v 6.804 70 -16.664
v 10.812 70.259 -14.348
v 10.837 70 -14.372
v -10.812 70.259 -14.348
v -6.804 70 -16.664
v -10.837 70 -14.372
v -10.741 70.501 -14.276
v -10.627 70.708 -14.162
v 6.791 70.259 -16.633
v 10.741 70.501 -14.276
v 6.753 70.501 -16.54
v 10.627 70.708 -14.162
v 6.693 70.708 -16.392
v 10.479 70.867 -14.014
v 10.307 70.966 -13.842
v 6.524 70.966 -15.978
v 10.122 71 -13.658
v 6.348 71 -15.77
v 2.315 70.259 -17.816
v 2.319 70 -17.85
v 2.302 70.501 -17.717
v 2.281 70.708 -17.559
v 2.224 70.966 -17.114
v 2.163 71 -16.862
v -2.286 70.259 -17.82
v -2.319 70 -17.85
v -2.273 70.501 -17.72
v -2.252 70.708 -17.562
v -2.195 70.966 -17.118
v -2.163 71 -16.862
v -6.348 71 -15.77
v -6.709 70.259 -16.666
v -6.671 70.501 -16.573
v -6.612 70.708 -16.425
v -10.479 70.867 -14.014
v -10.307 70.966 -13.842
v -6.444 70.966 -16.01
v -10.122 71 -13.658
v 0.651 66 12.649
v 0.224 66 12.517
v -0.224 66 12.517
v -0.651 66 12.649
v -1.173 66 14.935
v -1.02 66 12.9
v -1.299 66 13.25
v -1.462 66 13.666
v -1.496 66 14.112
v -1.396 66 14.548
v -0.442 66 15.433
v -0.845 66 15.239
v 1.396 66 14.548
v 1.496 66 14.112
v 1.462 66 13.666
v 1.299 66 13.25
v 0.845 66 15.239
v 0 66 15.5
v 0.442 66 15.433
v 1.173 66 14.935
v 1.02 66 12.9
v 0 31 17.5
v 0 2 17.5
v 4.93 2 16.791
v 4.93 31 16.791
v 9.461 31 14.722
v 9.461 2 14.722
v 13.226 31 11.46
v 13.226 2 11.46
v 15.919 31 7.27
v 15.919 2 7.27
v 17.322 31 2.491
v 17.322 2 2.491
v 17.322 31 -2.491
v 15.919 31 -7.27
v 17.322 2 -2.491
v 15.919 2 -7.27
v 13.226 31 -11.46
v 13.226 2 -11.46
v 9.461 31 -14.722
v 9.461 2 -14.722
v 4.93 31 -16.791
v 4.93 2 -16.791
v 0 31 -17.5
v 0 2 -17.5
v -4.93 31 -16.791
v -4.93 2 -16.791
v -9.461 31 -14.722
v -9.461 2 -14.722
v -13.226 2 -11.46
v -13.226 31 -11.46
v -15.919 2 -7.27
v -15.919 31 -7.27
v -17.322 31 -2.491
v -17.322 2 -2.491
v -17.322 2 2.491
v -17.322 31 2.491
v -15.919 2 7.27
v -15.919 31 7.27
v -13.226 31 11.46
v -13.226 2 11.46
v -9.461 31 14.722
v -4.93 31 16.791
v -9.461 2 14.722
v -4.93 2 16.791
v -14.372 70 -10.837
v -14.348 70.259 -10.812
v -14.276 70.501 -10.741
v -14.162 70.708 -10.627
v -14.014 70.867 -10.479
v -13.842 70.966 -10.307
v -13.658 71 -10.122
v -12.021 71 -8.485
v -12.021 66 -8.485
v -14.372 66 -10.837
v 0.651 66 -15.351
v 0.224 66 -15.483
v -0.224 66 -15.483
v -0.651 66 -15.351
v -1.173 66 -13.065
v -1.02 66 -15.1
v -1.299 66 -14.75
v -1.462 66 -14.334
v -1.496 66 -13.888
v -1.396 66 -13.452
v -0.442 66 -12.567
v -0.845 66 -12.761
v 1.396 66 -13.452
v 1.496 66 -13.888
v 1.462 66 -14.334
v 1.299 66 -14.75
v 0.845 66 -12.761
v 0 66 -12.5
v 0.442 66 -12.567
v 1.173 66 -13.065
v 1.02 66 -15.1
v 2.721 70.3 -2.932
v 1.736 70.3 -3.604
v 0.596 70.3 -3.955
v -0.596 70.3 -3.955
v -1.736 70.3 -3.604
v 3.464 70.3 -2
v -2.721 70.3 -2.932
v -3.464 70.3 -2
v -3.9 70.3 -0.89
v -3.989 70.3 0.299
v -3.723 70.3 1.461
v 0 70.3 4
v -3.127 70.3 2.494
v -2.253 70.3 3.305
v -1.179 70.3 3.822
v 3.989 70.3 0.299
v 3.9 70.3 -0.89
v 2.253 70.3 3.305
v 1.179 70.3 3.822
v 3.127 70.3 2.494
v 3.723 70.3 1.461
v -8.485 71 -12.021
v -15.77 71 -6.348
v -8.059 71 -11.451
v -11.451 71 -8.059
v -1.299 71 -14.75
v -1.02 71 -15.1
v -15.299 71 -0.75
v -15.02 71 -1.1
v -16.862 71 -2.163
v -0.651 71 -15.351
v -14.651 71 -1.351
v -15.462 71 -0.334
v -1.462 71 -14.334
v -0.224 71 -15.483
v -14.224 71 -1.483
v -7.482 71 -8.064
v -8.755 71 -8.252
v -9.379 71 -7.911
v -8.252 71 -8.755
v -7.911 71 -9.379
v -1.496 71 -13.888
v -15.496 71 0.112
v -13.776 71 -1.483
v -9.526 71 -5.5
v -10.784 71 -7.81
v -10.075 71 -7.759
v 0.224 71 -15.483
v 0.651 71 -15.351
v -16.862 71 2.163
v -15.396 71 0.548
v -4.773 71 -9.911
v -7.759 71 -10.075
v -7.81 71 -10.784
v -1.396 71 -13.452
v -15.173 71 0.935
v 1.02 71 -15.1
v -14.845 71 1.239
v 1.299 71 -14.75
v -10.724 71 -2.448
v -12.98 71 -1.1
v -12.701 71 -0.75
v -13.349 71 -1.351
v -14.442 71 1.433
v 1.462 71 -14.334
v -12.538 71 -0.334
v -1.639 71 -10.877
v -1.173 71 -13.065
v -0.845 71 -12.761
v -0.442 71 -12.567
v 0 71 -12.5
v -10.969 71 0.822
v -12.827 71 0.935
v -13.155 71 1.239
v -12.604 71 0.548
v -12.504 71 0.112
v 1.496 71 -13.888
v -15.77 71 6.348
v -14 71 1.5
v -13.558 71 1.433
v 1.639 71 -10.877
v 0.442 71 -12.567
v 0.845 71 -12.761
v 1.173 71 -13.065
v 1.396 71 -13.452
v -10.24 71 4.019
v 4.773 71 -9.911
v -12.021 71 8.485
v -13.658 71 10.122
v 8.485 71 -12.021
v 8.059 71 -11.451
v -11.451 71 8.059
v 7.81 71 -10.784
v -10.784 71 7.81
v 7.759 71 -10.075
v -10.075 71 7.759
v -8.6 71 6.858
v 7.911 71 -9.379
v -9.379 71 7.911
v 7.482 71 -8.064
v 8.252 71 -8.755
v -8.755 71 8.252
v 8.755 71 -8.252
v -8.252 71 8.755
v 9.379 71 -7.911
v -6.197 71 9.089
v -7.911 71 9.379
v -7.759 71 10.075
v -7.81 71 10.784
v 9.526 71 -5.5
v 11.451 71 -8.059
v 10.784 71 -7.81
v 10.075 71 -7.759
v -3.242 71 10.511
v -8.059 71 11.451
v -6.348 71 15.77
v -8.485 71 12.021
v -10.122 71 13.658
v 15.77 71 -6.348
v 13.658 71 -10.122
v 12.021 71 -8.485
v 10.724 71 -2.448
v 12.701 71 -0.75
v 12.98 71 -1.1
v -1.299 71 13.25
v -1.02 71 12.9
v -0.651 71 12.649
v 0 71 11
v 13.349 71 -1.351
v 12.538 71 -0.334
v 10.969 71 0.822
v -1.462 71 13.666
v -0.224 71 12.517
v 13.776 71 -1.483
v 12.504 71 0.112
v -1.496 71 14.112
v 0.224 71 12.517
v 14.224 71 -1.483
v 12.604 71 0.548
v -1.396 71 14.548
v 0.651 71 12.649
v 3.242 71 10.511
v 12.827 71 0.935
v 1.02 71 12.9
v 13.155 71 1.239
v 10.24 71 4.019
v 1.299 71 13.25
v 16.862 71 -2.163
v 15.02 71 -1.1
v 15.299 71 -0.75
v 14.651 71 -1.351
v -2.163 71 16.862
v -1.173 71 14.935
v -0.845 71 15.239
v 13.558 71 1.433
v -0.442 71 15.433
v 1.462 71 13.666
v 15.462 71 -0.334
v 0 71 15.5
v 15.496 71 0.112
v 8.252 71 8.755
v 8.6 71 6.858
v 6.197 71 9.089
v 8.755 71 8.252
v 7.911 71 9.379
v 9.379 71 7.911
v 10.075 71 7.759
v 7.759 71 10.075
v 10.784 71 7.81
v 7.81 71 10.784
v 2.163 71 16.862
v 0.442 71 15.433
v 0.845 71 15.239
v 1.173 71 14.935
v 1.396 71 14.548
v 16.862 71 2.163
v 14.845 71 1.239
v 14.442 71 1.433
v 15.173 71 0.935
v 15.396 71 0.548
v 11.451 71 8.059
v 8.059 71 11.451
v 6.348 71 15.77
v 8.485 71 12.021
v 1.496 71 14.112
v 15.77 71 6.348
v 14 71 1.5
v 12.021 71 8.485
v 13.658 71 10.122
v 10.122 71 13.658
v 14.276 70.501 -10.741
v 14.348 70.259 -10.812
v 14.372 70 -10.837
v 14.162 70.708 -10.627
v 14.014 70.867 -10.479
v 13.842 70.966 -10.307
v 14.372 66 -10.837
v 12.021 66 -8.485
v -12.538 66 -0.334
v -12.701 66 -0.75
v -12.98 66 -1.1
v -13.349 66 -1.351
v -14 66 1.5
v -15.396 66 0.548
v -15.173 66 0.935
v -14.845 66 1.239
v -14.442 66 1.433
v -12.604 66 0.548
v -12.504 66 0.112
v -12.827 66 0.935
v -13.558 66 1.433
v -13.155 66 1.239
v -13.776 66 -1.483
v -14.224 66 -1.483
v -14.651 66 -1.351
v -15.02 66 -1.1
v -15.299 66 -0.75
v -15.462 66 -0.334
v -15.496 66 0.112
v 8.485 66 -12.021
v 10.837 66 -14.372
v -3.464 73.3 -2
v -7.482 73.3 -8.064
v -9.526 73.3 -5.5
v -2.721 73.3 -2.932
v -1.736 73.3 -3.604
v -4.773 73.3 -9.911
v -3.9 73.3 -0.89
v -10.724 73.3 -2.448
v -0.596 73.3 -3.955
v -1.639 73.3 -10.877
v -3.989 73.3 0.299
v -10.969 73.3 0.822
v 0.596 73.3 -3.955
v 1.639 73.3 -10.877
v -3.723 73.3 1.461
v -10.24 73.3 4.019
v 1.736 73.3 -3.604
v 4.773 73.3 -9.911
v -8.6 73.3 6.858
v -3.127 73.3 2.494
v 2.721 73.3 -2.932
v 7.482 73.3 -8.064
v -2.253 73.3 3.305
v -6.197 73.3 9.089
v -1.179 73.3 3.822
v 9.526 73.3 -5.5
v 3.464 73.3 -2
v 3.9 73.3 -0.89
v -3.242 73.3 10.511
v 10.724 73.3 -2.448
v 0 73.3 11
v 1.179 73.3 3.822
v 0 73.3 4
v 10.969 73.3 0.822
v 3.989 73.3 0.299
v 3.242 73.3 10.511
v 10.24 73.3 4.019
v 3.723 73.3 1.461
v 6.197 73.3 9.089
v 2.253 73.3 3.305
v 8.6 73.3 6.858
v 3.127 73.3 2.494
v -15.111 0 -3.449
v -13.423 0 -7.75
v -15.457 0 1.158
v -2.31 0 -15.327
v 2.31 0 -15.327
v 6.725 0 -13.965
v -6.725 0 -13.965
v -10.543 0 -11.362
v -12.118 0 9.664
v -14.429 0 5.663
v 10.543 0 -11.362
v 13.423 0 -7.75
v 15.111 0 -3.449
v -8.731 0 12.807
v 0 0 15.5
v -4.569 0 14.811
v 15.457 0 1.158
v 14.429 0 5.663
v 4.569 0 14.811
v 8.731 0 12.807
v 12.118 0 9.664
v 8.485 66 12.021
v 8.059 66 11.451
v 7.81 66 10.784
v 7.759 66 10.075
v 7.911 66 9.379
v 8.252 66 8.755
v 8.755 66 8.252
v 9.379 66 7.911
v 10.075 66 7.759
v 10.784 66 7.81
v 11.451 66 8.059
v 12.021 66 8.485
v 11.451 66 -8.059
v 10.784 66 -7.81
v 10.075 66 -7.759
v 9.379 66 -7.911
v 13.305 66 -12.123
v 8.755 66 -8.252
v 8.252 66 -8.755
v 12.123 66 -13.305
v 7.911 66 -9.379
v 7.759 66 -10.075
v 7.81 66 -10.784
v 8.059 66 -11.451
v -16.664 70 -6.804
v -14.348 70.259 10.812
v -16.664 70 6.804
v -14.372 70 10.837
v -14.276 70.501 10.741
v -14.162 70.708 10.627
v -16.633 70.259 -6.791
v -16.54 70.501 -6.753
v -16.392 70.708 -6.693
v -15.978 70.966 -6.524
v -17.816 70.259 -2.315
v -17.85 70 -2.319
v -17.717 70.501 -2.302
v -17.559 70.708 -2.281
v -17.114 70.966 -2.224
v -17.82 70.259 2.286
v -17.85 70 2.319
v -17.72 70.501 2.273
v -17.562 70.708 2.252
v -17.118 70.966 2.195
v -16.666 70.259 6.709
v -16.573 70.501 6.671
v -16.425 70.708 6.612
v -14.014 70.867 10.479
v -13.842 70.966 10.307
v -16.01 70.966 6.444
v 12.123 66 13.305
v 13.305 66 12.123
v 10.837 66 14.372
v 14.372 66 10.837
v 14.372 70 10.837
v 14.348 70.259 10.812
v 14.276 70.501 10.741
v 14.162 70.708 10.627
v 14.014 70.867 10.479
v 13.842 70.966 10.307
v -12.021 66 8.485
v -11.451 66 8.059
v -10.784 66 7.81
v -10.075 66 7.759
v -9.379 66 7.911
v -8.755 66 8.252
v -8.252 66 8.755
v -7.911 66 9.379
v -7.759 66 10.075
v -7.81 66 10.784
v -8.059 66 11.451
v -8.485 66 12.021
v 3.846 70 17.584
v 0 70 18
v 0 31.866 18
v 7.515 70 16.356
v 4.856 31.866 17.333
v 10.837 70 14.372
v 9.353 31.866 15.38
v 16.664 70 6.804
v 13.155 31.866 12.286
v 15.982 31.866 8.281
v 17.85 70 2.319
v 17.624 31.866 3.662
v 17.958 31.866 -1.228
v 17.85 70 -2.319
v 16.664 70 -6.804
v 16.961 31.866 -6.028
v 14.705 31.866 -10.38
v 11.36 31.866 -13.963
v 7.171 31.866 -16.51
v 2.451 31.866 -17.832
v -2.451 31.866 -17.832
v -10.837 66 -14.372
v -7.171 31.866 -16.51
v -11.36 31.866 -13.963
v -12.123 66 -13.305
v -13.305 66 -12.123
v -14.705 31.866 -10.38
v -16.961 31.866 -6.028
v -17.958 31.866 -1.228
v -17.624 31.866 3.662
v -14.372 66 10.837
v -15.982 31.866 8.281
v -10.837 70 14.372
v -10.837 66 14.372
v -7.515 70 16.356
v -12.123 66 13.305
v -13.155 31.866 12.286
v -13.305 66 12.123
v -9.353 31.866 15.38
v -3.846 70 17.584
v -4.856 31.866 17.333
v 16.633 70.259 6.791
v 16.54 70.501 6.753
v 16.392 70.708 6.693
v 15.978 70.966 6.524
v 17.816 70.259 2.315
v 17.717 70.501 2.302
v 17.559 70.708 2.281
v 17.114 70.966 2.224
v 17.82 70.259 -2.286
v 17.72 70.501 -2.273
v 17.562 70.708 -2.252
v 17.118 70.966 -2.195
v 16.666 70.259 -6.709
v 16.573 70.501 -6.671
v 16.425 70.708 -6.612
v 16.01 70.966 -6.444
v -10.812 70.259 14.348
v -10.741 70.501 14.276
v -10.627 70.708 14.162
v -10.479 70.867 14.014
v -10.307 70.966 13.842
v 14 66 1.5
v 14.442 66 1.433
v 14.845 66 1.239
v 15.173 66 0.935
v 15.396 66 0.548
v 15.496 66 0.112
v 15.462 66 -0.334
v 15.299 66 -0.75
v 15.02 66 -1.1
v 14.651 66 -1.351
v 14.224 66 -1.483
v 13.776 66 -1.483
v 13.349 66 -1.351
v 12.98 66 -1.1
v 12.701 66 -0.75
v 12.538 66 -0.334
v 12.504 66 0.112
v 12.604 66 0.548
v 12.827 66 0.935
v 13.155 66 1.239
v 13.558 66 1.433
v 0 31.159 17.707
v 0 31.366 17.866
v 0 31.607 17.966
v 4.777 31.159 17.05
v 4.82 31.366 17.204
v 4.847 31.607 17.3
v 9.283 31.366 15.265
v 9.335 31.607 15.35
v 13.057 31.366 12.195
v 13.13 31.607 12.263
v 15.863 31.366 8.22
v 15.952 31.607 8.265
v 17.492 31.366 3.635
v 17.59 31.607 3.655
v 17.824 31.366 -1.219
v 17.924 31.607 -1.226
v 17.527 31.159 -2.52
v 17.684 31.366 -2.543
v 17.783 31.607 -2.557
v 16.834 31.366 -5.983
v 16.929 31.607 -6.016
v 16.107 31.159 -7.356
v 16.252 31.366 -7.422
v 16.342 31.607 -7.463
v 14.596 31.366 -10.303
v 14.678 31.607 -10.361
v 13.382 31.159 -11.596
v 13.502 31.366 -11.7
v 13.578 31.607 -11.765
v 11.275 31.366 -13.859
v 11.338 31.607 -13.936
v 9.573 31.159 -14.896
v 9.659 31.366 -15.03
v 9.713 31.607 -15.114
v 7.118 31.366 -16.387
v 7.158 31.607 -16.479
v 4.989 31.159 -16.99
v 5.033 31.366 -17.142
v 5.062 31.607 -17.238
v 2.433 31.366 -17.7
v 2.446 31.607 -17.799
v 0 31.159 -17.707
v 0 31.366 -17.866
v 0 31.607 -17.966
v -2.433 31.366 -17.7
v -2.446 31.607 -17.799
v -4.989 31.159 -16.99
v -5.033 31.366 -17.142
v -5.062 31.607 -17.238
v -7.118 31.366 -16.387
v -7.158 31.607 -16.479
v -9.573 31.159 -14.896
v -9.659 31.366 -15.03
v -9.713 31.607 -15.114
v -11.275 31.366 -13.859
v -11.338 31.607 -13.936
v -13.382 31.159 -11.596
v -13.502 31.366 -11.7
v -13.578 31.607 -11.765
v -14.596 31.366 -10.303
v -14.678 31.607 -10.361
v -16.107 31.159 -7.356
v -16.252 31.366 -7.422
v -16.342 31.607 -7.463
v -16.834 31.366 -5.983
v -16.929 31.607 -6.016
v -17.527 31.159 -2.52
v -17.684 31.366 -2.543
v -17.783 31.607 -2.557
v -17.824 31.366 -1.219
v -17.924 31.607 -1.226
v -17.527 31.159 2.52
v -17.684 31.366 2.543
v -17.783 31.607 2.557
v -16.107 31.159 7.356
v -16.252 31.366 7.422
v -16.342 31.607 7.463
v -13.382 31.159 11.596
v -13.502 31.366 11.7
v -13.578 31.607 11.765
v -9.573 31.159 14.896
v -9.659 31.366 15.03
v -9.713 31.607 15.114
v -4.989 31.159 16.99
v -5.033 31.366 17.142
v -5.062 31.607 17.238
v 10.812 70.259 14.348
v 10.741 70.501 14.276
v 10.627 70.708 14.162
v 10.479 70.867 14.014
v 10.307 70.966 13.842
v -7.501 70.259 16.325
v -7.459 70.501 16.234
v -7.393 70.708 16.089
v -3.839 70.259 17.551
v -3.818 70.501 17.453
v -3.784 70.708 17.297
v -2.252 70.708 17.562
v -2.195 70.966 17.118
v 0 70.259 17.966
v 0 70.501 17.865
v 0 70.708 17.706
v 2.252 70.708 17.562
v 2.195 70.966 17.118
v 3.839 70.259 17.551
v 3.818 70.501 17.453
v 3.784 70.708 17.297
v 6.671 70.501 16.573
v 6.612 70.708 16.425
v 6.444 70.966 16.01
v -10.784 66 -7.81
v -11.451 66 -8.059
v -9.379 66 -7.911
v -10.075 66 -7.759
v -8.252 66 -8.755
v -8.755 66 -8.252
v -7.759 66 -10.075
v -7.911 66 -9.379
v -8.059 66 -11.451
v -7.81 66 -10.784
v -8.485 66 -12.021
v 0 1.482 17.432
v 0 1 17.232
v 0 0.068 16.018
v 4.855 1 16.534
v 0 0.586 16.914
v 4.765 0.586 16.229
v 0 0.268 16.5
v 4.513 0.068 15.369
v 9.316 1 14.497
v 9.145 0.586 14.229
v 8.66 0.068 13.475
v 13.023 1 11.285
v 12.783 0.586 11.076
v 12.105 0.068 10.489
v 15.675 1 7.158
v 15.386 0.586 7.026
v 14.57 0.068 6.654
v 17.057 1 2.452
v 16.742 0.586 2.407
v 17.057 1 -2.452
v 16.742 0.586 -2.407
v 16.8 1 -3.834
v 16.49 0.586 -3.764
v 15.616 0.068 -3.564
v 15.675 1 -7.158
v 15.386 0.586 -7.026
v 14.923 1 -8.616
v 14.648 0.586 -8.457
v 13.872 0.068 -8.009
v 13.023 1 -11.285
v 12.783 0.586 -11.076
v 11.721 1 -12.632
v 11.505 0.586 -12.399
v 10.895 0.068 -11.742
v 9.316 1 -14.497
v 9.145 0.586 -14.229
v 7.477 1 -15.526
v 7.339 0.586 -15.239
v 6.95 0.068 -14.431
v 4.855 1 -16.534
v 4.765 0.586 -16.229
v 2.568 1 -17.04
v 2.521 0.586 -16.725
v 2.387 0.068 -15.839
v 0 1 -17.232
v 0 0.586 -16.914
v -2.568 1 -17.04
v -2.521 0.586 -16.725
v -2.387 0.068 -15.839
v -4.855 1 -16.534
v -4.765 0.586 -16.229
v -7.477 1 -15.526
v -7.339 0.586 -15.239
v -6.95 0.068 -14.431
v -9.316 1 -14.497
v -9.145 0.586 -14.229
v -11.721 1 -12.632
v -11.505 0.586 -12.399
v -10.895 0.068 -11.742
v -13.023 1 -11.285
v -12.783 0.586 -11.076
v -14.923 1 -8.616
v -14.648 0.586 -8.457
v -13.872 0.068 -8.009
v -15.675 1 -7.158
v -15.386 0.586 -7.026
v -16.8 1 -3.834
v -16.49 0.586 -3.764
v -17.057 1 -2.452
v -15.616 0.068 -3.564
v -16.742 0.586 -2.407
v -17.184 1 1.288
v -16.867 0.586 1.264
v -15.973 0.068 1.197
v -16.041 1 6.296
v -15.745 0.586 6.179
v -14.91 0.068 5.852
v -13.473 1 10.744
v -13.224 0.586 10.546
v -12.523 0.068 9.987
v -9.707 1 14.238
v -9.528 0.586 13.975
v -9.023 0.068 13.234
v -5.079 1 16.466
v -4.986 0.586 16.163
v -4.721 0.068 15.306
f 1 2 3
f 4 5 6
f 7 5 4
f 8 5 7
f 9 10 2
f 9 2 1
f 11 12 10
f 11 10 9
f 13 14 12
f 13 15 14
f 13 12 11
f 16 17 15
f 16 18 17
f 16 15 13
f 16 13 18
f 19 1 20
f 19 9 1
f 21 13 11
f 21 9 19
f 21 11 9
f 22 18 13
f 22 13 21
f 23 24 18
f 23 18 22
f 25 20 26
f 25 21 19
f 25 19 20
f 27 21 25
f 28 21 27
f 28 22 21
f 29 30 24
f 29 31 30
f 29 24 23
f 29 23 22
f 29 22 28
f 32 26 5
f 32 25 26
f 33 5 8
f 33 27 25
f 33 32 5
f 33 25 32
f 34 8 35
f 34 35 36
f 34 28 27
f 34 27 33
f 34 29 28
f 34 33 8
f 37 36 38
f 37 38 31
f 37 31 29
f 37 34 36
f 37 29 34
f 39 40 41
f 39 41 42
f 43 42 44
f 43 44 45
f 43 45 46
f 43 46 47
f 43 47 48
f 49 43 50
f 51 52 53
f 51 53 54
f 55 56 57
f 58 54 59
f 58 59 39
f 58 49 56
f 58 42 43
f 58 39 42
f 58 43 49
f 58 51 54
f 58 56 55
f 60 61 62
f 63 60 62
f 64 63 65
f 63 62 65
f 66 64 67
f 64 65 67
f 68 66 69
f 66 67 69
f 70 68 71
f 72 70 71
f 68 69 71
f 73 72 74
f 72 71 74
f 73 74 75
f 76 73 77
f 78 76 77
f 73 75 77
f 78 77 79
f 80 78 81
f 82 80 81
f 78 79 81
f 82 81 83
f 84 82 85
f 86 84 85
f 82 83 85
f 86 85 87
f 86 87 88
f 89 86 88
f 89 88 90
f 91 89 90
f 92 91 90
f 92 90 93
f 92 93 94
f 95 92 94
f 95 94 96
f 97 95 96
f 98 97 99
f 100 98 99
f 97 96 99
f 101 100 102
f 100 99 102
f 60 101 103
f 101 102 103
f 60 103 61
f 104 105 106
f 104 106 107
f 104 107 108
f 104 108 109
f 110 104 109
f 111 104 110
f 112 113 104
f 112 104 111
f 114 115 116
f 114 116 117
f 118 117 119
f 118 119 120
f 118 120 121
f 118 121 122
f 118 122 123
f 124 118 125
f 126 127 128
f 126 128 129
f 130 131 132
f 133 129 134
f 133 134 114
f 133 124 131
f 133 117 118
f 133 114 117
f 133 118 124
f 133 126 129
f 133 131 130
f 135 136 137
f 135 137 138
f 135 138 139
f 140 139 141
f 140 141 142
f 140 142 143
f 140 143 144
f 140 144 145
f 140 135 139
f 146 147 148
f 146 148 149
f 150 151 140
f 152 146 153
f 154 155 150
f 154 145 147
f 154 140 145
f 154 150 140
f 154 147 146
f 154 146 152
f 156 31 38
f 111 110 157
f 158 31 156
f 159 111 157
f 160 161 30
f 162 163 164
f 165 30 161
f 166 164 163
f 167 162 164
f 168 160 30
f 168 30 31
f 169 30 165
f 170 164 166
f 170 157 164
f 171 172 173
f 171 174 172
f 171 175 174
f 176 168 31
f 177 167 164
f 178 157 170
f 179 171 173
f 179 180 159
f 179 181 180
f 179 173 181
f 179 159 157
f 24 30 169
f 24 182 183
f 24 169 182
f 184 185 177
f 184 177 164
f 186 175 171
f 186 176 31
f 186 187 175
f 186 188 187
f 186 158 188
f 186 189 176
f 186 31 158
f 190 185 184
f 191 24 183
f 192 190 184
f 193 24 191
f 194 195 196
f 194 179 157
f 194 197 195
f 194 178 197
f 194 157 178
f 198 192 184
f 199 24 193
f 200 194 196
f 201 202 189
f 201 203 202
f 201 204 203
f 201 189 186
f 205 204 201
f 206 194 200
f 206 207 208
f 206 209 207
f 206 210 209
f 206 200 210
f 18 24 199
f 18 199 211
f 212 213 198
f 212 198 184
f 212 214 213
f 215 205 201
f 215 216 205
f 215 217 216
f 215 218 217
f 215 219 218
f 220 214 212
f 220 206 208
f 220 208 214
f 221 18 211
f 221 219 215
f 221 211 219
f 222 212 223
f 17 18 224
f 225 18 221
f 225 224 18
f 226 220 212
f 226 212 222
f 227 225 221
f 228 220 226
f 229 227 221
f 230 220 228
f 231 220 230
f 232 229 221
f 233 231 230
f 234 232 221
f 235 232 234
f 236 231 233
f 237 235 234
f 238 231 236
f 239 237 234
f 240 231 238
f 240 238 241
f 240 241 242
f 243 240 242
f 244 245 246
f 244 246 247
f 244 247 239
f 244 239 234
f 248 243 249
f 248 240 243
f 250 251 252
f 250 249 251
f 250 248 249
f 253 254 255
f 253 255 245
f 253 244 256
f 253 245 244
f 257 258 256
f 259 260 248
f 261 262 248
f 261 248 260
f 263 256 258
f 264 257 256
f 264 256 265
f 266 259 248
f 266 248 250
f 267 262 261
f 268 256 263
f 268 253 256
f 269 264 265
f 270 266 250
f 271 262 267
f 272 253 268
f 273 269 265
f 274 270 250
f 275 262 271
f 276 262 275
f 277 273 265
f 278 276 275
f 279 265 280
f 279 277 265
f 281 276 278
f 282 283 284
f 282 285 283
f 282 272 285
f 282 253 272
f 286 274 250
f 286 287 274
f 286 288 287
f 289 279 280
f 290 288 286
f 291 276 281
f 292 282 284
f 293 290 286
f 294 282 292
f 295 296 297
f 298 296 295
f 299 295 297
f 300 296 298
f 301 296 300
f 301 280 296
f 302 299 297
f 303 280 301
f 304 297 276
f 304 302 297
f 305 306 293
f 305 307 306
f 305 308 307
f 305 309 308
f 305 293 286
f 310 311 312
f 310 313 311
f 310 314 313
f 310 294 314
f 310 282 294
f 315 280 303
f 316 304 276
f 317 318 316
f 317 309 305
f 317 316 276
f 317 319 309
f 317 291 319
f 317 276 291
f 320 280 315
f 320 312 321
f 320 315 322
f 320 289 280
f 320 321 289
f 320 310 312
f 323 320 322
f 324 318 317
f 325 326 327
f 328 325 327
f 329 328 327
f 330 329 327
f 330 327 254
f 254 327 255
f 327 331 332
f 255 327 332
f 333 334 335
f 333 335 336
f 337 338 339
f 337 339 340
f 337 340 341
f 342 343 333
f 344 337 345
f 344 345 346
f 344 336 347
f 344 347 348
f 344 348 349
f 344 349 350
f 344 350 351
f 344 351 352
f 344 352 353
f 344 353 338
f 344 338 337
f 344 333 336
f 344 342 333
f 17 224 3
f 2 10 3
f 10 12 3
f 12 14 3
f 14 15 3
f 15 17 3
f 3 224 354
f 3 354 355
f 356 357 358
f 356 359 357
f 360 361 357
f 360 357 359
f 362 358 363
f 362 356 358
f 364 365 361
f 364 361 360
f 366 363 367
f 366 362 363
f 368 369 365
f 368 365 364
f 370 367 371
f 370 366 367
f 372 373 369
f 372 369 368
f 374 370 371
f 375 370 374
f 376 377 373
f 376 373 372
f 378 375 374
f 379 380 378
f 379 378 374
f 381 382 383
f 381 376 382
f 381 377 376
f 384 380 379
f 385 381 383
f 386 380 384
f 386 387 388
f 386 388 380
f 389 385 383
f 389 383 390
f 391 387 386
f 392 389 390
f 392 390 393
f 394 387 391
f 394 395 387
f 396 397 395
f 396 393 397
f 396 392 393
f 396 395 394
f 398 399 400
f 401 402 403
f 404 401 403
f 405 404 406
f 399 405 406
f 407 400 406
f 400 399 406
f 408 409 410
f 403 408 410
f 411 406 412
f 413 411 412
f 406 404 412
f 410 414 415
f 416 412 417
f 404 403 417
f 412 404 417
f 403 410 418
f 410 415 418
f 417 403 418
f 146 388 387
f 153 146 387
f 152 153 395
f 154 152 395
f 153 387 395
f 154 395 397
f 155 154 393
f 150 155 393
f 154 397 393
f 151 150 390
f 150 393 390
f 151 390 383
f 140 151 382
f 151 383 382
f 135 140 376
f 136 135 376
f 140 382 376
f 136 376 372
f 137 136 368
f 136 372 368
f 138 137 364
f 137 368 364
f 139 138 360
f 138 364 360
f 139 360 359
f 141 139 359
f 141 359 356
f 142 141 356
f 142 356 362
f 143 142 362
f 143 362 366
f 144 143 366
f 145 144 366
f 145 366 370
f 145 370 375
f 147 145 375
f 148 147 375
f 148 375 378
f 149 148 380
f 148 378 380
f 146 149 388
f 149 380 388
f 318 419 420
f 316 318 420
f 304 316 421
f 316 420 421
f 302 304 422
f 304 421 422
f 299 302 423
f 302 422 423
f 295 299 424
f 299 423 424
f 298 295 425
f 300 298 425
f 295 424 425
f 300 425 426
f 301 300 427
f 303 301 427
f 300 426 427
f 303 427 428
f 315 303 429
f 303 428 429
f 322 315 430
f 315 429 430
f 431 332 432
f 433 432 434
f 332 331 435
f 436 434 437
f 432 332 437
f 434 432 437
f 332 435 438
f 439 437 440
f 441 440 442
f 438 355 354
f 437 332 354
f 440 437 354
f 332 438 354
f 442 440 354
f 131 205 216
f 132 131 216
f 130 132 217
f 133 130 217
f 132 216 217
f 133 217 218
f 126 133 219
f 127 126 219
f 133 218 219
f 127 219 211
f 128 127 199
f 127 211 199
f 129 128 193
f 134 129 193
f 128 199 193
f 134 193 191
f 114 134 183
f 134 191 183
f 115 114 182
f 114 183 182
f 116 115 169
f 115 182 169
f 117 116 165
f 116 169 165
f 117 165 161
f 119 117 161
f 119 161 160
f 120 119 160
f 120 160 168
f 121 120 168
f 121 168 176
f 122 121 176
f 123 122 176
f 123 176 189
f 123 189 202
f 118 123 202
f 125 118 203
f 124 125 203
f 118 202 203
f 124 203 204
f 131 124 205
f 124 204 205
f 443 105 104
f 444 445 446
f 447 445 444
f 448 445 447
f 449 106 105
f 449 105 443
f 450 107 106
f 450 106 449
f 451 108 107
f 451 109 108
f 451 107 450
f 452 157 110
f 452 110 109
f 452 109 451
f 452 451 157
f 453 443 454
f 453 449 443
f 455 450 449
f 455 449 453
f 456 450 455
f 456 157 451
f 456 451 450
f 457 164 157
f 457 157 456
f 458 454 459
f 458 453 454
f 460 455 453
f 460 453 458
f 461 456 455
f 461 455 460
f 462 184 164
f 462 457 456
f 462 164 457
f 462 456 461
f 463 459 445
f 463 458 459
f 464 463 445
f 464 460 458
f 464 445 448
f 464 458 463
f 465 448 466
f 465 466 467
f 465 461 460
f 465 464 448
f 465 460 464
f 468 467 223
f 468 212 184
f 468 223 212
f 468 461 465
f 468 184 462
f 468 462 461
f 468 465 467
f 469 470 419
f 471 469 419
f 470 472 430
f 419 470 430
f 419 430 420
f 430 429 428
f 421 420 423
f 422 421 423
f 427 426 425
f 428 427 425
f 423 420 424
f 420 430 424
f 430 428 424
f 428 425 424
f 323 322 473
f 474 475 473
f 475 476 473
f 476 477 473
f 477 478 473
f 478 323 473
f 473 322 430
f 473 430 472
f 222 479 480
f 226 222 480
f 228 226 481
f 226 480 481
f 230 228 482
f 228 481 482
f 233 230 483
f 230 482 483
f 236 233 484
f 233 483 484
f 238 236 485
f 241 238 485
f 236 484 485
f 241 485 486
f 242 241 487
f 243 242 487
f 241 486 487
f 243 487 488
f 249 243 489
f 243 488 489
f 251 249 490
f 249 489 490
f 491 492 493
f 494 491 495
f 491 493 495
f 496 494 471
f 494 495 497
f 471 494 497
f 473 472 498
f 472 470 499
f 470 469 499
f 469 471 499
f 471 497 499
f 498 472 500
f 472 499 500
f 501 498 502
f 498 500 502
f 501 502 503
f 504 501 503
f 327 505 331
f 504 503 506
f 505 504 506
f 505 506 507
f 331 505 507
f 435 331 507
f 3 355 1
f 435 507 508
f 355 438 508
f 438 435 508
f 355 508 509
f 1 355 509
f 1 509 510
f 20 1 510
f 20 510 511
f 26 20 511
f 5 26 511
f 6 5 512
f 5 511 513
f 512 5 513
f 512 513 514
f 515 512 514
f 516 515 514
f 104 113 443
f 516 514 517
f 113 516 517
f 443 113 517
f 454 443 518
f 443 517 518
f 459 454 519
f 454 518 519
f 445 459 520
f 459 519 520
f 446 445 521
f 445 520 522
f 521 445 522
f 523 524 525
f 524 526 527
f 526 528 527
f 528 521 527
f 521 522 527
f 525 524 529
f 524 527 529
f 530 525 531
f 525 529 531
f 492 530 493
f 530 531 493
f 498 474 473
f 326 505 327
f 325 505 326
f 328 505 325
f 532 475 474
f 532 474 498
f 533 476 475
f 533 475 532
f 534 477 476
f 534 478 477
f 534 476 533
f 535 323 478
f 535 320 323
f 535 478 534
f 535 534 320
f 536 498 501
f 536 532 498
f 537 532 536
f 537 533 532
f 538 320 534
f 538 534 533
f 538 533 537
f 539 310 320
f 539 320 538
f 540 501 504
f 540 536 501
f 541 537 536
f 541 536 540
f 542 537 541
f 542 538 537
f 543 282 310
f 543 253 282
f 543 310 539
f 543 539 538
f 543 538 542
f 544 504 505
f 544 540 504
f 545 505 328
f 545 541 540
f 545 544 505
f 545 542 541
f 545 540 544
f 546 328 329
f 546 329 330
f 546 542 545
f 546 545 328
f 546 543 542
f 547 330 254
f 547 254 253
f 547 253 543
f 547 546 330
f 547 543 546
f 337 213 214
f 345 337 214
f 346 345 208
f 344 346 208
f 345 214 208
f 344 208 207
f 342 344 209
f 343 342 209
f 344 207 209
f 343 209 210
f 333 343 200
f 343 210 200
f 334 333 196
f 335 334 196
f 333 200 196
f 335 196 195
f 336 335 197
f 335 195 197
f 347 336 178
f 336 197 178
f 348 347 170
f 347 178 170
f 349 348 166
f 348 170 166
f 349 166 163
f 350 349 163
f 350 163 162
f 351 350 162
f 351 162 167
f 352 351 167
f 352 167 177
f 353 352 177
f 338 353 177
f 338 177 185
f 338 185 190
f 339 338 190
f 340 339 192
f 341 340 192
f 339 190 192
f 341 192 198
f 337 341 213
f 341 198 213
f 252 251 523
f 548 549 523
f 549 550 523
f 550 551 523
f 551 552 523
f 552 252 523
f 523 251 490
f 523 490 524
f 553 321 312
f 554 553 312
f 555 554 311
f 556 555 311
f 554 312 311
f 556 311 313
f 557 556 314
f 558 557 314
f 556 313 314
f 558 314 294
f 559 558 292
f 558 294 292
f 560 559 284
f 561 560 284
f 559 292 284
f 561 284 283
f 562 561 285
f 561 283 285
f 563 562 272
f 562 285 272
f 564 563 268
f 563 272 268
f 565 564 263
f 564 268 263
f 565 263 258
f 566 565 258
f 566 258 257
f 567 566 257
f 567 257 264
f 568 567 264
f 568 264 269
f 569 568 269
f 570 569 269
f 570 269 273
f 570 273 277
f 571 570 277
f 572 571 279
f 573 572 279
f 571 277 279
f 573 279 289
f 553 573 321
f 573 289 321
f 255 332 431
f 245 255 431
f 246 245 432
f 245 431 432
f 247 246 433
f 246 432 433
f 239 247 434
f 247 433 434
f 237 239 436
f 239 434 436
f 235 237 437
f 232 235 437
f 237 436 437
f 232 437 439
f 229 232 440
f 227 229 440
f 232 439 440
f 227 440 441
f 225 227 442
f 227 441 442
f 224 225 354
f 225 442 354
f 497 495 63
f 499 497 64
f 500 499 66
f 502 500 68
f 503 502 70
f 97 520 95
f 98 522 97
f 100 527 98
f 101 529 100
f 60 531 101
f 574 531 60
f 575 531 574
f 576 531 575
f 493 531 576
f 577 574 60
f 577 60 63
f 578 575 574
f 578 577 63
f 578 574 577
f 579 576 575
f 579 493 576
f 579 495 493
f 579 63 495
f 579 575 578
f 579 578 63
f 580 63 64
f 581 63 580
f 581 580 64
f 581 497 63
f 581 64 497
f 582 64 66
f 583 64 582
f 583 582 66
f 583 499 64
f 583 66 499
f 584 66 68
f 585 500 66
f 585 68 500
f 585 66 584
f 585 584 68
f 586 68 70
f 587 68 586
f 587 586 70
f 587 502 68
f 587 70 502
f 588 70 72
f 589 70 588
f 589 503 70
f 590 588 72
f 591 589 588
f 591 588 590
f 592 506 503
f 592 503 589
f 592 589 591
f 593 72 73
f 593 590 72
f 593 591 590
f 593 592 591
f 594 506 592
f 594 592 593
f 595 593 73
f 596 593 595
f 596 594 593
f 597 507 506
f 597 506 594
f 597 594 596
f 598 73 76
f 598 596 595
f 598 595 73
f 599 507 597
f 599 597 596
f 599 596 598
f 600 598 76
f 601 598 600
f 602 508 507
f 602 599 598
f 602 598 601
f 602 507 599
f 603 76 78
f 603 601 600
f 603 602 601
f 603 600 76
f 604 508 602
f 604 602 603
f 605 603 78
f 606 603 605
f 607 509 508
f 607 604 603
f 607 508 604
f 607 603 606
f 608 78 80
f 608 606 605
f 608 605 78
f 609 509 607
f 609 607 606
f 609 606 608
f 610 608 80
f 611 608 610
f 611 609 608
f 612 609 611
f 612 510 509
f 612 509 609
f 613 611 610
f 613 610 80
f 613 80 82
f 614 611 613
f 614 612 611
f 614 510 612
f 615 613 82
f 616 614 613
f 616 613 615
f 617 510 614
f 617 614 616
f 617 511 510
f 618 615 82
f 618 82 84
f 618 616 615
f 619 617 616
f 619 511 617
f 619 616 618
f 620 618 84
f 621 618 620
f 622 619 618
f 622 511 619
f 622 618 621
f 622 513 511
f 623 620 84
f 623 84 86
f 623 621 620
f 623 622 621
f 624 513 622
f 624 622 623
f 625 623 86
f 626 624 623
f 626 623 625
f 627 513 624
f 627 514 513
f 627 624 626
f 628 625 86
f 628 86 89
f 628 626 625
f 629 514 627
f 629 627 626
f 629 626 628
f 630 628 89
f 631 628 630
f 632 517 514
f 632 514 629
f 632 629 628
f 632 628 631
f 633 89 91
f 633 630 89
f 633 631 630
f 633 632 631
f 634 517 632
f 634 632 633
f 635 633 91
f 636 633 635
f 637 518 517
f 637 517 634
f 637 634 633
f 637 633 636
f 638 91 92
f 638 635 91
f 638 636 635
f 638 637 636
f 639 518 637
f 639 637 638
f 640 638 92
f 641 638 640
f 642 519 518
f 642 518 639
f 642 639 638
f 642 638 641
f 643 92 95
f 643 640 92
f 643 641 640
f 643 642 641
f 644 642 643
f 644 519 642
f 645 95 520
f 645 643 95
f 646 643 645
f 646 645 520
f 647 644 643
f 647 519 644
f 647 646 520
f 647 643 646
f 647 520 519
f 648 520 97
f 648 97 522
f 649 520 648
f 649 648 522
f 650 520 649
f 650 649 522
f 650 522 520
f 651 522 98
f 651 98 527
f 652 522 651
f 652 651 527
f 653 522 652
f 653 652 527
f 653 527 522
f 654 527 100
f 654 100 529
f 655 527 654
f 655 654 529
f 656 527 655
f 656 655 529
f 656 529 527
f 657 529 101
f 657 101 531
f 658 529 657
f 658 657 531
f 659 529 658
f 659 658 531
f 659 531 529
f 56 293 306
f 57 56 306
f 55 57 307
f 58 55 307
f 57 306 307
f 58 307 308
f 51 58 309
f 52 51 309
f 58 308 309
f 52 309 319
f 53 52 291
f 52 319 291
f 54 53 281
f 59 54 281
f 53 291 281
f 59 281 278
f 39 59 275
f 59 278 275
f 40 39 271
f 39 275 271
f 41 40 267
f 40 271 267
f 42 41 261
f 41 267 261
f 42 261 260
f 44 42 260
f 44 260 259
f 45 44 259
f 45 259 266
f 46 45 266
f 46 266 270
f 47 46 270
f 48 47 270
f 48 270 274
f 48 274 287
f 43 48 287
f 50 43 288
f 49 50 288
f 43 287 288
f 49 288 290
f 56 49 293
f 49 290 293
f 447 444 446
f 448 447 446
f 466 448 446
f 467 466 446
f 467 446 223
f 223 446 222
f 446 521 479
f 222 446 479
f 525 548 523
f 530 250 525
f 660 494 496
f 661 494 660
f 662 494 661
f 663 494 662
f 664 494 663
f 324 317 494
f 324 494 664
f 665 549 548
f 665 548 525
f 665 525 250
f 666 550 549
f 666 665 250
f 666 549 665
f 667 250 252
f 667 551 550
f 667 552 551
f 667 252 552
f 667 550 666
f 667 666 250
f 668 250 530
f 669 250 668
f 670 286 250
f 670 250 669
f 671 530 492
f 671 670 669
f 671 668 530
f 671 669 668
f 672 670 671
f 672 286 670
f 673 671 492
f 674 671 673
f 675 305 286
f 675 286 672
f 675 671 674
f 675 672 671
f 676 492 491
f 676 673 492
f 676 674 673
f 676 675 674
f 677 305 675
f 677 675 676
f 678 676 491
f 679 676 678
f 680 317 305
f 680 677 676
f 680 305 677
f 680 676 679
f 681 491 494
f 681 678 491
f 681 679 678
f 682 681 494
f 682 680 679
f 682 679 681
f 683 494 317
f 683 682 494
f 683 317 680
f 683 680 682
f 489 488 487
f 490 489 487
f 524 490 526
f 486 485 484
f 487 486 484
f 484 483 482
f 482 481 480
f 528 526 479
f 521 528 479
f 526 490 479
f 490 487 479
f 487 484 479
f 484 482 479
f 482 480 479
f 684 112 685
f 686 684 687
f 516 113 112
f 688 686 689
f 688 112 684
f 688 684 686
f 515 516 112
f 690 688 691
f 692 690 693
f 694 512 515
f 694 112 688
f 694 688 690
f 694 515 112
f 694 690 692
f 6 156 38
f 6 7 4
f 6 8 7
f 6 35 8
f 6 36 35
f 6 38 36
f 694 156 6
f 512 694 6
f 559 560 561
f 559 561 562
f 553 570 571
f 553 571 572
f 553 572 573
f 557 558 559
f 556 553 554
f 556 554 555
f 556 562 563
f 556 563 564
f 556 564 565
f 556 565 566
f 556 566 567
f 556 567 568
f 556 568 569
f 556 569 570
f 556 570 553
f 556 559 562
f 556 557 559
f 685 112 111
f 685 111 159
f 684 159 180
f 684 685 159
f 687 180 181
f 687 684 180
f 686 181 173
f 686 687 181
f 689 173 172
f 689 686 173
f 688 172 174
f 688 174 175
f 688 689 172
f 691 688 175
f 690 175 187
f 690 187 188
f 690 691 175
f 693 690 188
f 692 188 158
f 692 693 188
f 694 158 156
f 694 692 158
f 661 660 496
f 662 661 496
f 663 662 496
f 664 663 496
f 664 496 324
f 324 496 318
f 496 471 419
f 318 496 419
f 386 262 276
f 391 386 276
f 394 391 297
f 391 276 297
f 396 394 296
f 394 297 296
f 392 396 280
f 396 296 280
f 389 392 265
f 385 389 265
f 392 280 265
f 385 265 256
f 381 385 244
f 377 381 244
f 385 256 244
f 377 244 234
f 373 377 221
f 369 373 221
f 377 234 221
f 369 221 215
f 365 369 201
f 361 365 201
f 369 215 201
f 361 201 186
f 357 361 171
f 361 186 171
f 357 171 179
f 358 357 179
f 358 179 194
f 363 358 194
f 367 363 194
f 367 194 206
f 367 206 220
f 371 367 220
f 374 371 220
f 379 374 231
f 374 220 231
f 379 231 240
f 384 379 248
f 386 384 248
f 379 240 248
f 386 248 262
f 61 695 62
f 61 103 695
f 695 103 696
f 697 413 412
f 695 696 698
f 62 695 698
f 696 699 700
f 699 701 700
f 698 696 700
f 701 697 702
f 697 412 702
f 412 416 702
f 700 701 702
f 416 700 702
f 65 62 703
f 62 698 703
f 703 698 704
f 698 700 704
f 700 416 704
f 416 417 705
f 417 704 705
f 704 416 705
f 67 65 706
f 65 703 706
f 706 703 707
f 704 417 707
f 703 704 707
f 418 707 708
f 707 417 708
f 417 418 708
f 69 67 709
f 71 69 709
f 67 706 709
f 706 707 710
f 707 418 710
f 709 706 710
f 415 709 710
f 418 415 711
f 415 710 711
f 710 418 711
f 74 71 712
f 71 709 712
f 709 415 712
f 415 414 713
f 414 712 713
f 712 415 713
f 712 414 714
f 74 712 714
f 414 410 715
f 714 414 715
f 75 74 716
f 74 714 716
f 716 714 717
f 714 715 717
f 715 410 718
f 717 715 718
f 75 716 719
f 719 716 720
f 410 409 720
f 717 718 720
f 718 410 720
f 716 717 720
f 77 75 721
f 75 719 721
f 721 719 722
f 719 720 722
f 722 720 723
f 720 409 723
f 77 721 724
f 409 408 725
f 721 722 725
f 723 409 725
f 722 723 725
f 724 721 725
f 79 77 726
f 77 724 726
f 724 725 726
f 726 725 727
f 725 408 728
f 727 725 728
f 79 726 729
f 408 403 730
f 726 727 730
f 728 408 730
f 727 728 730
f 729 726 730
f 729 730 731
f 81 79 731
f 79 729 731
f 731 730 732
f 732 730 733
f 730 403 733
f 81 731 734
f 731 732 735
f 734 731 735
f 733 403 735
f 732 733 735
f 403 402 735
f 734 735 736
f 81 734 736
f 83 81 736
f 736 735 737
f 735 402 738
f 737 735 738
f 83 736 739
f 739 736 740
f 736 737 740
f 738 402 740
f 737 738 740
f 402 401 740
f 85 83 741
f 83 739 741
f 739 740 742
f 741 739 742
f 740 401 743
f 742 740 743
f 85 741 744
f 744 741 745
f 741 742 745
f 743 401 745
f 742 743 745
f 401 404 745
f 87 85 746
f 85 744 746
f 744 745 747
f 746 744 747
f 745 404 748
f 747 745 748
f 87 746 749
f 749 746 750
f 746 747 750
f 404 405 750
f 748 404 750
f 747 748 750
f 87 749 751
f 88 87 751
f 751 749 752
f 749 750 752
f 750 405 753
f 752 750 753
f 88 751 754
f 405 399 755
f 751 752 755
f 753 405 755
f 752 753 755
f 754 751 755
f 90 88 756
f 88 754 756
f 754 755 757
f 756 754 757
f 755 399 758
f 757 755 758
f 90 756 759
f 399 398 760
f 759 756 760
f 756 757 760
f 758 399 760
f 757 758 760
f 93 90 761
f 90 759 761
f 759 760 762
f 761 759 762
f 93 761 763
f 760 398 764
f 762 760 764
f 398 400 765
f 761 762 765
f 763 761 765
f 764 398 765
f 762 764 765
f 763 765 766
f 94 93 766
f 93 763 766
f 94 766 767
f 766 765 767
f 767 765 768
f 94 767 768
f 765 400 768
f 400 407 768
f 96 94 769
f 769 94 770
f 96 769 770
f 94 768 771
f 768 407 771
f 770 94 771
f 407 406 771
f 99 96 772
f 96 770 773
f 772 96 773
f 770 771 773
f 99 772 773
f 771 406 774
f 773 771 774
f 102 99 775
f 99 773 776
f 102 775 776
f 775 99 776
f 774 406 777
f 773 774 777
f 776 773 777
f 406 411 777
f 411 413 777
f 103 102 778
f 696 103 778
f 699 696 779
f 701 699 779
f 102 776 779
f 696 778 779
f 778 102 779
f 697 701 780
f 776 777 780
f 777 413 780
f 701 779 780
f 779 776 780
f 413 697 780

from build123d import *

# Parameters (mm, degrees)
SKETCH1_R           = 17.5
BOSS_EXTRUDE1_DEPTH = 31
SKETCH2_R           = 18
BOSS_EXTRUDE2_DEPTH = 40
FILLET1_R           = 2
FILLET2_R           = 1
SKETCH3_R           = 11
BOSS_EXTRUDE3_DEPTH = 2.3
SKETCH4_R           = 4
CUT_EXTRUDE1_DEPTH  = 3
SKETCH5_R           = 1.5
CUT_EXTRUDE2_DEPTH  = 5
FILLET3_R           = 1
CUT_EXTRUDE3_START  = -5
CUT_EXTRUDE3_DEPTH  = 5


with BuildPart() as part:
    # Sketch1 → Boss-Extrude1 (new body)
    with BuildSketch(Plane(origin=(0, 0, 0), x_dir=(1, 0, 0), z_dir=(0, 1, 0))):
        with Locations(Location((0, 0, 0), (0, 0, 270))):
            Circle(SKETCH1_R)
    extrude(amount=BOSS_EXTRUDE1_DEPTH)

    # Sketch2 → Boss-Extrude2 (add)
    with BuildSketch(Plane(origin=(0, 31, 0), x_dir=(1, 0, 0), z_dir=(0, 1, 0))):
        with Locations(Location((0, 0, 0), (0, 0, 270))):
            Circle(SKETCH2_R)
    extrude(amount=BOSS_EXTRUDE2_DEPTH)

    # Fillet1
    fillet1_edges = [part.edges().sort_by_distance(p)[0] for p in [
        (0, 0, -17.5),
    ]]
    fillet(fillet1_edges, radius=FILLET1_R)

    # Fillet2
    # the kernel refuses this fillet: 1 mm, written as the material it takes off along each edge
    with BuildSketch(Plane(origin=(0, 31, 0), x_dir=(0, 0, 1), z_dir=(-1, 0, 0))) as fillet2_piece_1:
        with BuildLine():
            CenterArc((17, 0.866025404), FILLET2_R, 300, 60)
            Line((18, 0.866025404), (18.02, 0.866025404))
            Line((18.02, 0.866025404), (18.02, 0))
            Line((18.02, 0), (18, -0.02))
            ThreePointArc((18, -0.02), (17.75, -0.02), (17.51, -0.017320508))
            Line((17.51, -0.017320508), (17.5, 0))
        make_face()
    revolve(axis=Axis((0, 31, 0), (0, 1, 0)), mode=Mode.SUBTRACT)

    # Sketch3 → Boss-Extrude3 (add)
    with BuildSketch(Plane(origin=(0, 71, 0), x_dir=(1, 0, 0), z_dir=(0, 1, 0))):
        with Locations(Location((0, 0, 0), (0, 0, 270))):
            Circle(SKETCH3_R)
    extrude(amount=BOSS_EXTRUDE3_DEPTH)

    # Sketch4 → Cut-Extrude1 (cut)
    with BuildSketch(Plane(origin=(0, 73.3, 0), x_dir=(1, 0, 0), z_dir=(0, 1, 0))):
        with Locations(Location((0, 0, 0), (0, 0, 270))):
            Circle(SKETCH4_R)
    extrude(amount=-CUT_EXTRUDE1_DEPTH, mode=Mode.SUBTRACT)

    # Sketch5 → Cut-Extrude2 (cut)
    with BuildSketch(Plane(origin=(0, 71, 0), x_dir=(1, 0, 0), z_dir=(0, 1, 0))):
        with Locations(Location((-14, 0, 0), (0, 0, 270))):
            Circle(SKETCH5_R)
        with Locations(Location((0, 14, 0), (0, 0, 270))):
            Circle(SKETCH5_R)
        with Locations(Location((14, 0, 0), (0, 0, 270))):
            Circle(SKETCH5_R)
        with Locations(Location((0, -14, 0), (0, 0, 270))):
            Circle(SKETCH5_R)
    extrude(amount=-CUT_EXTRUDE2_DEPTH, mode=Mode.SUBTRACT)

    # Fillet3
    fillet3_edges = [part.edges().sort_by_distance(p)[0] for p in [
        (0, 71, -18),
    ]]
    fillet(fillet3_edges, radius=FILLET3_R)

    # Sketch6 → Cut-Extrude3 (cut)
    with BuildSketch(Plane(origin=(0, 71, 0), x_dir=(1, 0, 0), z_dir=(0, 1, 0)).offset(CUT_EXTRUDE3_START)):
        with BuildLine():
            Line((-14.372329619, 10.836795713), (-12.02081528, 8.485281374))
            ThreePointArc((-12.02081528, 8.485281374), (-8.485281374, 8.485281374), (-8.485281374, 12.02081528))
            Line((-8.485281374, 12.02081528), (-10.836795713, 14.372329619))
            ThreePointArc((-10.836795713, 14.372329619), (-12.727922061, 12.727922061), (-14.372329619, 10.836795713))
        make_face()
        with BuildLine():
            Line((14.372329619, 10.836795713), (12.02081528, 8.485281374))
            ThreePointArc((12.02081528, 8.485281374), (8.485281374, 8.485281374), (8.485281374, 12.02081528))
            Line((8.485281374, 12.02081528), (10.836795713, 14.372329619))
            ThreePointArc((10.836795713, 14.372329619), (12.727922061, 12.727922061), (14.372329619, 10.836795713))
        make_face()
        with BuildLine():
            Line((10.836795713, -14.372329619), (8.485281374, -12.02081528))
            ThreePointArc((8.485281374, -12.02081528), (8.485281374, -8.485281374), (12.02081528, -8.485281374))
            Line((12.02081528, -8.485281374), (14.372329619, -10.836795713))
            ThreePointArc((14.372329619, -10.836795713), (12.727922061, -12.727922061), (10.836795713, -14.372329619))
        make_face()
        with BuildLine():
            Line((-14.372329619, -10.836795713), (-12.02081528, -8.485281374))
            ThreePointArc((-12.02081528, -8.485281374), (-8.485281374, -8.485281374), (-8.485281374, -12.02081528))
            Line((-8.485281374, -12.02081528), (-10.836795713, -14.372329619))
            ThreePointArc((-10.836795713, -14.372329619), (-12.727922061, -12.727922061), (-14.372329619, -10.836795713))
        make_face()
    extrude(amount=CUT_EXTRUDE3_DEPTH, mode=Mode.SUBTRACT)


solid = part.part
